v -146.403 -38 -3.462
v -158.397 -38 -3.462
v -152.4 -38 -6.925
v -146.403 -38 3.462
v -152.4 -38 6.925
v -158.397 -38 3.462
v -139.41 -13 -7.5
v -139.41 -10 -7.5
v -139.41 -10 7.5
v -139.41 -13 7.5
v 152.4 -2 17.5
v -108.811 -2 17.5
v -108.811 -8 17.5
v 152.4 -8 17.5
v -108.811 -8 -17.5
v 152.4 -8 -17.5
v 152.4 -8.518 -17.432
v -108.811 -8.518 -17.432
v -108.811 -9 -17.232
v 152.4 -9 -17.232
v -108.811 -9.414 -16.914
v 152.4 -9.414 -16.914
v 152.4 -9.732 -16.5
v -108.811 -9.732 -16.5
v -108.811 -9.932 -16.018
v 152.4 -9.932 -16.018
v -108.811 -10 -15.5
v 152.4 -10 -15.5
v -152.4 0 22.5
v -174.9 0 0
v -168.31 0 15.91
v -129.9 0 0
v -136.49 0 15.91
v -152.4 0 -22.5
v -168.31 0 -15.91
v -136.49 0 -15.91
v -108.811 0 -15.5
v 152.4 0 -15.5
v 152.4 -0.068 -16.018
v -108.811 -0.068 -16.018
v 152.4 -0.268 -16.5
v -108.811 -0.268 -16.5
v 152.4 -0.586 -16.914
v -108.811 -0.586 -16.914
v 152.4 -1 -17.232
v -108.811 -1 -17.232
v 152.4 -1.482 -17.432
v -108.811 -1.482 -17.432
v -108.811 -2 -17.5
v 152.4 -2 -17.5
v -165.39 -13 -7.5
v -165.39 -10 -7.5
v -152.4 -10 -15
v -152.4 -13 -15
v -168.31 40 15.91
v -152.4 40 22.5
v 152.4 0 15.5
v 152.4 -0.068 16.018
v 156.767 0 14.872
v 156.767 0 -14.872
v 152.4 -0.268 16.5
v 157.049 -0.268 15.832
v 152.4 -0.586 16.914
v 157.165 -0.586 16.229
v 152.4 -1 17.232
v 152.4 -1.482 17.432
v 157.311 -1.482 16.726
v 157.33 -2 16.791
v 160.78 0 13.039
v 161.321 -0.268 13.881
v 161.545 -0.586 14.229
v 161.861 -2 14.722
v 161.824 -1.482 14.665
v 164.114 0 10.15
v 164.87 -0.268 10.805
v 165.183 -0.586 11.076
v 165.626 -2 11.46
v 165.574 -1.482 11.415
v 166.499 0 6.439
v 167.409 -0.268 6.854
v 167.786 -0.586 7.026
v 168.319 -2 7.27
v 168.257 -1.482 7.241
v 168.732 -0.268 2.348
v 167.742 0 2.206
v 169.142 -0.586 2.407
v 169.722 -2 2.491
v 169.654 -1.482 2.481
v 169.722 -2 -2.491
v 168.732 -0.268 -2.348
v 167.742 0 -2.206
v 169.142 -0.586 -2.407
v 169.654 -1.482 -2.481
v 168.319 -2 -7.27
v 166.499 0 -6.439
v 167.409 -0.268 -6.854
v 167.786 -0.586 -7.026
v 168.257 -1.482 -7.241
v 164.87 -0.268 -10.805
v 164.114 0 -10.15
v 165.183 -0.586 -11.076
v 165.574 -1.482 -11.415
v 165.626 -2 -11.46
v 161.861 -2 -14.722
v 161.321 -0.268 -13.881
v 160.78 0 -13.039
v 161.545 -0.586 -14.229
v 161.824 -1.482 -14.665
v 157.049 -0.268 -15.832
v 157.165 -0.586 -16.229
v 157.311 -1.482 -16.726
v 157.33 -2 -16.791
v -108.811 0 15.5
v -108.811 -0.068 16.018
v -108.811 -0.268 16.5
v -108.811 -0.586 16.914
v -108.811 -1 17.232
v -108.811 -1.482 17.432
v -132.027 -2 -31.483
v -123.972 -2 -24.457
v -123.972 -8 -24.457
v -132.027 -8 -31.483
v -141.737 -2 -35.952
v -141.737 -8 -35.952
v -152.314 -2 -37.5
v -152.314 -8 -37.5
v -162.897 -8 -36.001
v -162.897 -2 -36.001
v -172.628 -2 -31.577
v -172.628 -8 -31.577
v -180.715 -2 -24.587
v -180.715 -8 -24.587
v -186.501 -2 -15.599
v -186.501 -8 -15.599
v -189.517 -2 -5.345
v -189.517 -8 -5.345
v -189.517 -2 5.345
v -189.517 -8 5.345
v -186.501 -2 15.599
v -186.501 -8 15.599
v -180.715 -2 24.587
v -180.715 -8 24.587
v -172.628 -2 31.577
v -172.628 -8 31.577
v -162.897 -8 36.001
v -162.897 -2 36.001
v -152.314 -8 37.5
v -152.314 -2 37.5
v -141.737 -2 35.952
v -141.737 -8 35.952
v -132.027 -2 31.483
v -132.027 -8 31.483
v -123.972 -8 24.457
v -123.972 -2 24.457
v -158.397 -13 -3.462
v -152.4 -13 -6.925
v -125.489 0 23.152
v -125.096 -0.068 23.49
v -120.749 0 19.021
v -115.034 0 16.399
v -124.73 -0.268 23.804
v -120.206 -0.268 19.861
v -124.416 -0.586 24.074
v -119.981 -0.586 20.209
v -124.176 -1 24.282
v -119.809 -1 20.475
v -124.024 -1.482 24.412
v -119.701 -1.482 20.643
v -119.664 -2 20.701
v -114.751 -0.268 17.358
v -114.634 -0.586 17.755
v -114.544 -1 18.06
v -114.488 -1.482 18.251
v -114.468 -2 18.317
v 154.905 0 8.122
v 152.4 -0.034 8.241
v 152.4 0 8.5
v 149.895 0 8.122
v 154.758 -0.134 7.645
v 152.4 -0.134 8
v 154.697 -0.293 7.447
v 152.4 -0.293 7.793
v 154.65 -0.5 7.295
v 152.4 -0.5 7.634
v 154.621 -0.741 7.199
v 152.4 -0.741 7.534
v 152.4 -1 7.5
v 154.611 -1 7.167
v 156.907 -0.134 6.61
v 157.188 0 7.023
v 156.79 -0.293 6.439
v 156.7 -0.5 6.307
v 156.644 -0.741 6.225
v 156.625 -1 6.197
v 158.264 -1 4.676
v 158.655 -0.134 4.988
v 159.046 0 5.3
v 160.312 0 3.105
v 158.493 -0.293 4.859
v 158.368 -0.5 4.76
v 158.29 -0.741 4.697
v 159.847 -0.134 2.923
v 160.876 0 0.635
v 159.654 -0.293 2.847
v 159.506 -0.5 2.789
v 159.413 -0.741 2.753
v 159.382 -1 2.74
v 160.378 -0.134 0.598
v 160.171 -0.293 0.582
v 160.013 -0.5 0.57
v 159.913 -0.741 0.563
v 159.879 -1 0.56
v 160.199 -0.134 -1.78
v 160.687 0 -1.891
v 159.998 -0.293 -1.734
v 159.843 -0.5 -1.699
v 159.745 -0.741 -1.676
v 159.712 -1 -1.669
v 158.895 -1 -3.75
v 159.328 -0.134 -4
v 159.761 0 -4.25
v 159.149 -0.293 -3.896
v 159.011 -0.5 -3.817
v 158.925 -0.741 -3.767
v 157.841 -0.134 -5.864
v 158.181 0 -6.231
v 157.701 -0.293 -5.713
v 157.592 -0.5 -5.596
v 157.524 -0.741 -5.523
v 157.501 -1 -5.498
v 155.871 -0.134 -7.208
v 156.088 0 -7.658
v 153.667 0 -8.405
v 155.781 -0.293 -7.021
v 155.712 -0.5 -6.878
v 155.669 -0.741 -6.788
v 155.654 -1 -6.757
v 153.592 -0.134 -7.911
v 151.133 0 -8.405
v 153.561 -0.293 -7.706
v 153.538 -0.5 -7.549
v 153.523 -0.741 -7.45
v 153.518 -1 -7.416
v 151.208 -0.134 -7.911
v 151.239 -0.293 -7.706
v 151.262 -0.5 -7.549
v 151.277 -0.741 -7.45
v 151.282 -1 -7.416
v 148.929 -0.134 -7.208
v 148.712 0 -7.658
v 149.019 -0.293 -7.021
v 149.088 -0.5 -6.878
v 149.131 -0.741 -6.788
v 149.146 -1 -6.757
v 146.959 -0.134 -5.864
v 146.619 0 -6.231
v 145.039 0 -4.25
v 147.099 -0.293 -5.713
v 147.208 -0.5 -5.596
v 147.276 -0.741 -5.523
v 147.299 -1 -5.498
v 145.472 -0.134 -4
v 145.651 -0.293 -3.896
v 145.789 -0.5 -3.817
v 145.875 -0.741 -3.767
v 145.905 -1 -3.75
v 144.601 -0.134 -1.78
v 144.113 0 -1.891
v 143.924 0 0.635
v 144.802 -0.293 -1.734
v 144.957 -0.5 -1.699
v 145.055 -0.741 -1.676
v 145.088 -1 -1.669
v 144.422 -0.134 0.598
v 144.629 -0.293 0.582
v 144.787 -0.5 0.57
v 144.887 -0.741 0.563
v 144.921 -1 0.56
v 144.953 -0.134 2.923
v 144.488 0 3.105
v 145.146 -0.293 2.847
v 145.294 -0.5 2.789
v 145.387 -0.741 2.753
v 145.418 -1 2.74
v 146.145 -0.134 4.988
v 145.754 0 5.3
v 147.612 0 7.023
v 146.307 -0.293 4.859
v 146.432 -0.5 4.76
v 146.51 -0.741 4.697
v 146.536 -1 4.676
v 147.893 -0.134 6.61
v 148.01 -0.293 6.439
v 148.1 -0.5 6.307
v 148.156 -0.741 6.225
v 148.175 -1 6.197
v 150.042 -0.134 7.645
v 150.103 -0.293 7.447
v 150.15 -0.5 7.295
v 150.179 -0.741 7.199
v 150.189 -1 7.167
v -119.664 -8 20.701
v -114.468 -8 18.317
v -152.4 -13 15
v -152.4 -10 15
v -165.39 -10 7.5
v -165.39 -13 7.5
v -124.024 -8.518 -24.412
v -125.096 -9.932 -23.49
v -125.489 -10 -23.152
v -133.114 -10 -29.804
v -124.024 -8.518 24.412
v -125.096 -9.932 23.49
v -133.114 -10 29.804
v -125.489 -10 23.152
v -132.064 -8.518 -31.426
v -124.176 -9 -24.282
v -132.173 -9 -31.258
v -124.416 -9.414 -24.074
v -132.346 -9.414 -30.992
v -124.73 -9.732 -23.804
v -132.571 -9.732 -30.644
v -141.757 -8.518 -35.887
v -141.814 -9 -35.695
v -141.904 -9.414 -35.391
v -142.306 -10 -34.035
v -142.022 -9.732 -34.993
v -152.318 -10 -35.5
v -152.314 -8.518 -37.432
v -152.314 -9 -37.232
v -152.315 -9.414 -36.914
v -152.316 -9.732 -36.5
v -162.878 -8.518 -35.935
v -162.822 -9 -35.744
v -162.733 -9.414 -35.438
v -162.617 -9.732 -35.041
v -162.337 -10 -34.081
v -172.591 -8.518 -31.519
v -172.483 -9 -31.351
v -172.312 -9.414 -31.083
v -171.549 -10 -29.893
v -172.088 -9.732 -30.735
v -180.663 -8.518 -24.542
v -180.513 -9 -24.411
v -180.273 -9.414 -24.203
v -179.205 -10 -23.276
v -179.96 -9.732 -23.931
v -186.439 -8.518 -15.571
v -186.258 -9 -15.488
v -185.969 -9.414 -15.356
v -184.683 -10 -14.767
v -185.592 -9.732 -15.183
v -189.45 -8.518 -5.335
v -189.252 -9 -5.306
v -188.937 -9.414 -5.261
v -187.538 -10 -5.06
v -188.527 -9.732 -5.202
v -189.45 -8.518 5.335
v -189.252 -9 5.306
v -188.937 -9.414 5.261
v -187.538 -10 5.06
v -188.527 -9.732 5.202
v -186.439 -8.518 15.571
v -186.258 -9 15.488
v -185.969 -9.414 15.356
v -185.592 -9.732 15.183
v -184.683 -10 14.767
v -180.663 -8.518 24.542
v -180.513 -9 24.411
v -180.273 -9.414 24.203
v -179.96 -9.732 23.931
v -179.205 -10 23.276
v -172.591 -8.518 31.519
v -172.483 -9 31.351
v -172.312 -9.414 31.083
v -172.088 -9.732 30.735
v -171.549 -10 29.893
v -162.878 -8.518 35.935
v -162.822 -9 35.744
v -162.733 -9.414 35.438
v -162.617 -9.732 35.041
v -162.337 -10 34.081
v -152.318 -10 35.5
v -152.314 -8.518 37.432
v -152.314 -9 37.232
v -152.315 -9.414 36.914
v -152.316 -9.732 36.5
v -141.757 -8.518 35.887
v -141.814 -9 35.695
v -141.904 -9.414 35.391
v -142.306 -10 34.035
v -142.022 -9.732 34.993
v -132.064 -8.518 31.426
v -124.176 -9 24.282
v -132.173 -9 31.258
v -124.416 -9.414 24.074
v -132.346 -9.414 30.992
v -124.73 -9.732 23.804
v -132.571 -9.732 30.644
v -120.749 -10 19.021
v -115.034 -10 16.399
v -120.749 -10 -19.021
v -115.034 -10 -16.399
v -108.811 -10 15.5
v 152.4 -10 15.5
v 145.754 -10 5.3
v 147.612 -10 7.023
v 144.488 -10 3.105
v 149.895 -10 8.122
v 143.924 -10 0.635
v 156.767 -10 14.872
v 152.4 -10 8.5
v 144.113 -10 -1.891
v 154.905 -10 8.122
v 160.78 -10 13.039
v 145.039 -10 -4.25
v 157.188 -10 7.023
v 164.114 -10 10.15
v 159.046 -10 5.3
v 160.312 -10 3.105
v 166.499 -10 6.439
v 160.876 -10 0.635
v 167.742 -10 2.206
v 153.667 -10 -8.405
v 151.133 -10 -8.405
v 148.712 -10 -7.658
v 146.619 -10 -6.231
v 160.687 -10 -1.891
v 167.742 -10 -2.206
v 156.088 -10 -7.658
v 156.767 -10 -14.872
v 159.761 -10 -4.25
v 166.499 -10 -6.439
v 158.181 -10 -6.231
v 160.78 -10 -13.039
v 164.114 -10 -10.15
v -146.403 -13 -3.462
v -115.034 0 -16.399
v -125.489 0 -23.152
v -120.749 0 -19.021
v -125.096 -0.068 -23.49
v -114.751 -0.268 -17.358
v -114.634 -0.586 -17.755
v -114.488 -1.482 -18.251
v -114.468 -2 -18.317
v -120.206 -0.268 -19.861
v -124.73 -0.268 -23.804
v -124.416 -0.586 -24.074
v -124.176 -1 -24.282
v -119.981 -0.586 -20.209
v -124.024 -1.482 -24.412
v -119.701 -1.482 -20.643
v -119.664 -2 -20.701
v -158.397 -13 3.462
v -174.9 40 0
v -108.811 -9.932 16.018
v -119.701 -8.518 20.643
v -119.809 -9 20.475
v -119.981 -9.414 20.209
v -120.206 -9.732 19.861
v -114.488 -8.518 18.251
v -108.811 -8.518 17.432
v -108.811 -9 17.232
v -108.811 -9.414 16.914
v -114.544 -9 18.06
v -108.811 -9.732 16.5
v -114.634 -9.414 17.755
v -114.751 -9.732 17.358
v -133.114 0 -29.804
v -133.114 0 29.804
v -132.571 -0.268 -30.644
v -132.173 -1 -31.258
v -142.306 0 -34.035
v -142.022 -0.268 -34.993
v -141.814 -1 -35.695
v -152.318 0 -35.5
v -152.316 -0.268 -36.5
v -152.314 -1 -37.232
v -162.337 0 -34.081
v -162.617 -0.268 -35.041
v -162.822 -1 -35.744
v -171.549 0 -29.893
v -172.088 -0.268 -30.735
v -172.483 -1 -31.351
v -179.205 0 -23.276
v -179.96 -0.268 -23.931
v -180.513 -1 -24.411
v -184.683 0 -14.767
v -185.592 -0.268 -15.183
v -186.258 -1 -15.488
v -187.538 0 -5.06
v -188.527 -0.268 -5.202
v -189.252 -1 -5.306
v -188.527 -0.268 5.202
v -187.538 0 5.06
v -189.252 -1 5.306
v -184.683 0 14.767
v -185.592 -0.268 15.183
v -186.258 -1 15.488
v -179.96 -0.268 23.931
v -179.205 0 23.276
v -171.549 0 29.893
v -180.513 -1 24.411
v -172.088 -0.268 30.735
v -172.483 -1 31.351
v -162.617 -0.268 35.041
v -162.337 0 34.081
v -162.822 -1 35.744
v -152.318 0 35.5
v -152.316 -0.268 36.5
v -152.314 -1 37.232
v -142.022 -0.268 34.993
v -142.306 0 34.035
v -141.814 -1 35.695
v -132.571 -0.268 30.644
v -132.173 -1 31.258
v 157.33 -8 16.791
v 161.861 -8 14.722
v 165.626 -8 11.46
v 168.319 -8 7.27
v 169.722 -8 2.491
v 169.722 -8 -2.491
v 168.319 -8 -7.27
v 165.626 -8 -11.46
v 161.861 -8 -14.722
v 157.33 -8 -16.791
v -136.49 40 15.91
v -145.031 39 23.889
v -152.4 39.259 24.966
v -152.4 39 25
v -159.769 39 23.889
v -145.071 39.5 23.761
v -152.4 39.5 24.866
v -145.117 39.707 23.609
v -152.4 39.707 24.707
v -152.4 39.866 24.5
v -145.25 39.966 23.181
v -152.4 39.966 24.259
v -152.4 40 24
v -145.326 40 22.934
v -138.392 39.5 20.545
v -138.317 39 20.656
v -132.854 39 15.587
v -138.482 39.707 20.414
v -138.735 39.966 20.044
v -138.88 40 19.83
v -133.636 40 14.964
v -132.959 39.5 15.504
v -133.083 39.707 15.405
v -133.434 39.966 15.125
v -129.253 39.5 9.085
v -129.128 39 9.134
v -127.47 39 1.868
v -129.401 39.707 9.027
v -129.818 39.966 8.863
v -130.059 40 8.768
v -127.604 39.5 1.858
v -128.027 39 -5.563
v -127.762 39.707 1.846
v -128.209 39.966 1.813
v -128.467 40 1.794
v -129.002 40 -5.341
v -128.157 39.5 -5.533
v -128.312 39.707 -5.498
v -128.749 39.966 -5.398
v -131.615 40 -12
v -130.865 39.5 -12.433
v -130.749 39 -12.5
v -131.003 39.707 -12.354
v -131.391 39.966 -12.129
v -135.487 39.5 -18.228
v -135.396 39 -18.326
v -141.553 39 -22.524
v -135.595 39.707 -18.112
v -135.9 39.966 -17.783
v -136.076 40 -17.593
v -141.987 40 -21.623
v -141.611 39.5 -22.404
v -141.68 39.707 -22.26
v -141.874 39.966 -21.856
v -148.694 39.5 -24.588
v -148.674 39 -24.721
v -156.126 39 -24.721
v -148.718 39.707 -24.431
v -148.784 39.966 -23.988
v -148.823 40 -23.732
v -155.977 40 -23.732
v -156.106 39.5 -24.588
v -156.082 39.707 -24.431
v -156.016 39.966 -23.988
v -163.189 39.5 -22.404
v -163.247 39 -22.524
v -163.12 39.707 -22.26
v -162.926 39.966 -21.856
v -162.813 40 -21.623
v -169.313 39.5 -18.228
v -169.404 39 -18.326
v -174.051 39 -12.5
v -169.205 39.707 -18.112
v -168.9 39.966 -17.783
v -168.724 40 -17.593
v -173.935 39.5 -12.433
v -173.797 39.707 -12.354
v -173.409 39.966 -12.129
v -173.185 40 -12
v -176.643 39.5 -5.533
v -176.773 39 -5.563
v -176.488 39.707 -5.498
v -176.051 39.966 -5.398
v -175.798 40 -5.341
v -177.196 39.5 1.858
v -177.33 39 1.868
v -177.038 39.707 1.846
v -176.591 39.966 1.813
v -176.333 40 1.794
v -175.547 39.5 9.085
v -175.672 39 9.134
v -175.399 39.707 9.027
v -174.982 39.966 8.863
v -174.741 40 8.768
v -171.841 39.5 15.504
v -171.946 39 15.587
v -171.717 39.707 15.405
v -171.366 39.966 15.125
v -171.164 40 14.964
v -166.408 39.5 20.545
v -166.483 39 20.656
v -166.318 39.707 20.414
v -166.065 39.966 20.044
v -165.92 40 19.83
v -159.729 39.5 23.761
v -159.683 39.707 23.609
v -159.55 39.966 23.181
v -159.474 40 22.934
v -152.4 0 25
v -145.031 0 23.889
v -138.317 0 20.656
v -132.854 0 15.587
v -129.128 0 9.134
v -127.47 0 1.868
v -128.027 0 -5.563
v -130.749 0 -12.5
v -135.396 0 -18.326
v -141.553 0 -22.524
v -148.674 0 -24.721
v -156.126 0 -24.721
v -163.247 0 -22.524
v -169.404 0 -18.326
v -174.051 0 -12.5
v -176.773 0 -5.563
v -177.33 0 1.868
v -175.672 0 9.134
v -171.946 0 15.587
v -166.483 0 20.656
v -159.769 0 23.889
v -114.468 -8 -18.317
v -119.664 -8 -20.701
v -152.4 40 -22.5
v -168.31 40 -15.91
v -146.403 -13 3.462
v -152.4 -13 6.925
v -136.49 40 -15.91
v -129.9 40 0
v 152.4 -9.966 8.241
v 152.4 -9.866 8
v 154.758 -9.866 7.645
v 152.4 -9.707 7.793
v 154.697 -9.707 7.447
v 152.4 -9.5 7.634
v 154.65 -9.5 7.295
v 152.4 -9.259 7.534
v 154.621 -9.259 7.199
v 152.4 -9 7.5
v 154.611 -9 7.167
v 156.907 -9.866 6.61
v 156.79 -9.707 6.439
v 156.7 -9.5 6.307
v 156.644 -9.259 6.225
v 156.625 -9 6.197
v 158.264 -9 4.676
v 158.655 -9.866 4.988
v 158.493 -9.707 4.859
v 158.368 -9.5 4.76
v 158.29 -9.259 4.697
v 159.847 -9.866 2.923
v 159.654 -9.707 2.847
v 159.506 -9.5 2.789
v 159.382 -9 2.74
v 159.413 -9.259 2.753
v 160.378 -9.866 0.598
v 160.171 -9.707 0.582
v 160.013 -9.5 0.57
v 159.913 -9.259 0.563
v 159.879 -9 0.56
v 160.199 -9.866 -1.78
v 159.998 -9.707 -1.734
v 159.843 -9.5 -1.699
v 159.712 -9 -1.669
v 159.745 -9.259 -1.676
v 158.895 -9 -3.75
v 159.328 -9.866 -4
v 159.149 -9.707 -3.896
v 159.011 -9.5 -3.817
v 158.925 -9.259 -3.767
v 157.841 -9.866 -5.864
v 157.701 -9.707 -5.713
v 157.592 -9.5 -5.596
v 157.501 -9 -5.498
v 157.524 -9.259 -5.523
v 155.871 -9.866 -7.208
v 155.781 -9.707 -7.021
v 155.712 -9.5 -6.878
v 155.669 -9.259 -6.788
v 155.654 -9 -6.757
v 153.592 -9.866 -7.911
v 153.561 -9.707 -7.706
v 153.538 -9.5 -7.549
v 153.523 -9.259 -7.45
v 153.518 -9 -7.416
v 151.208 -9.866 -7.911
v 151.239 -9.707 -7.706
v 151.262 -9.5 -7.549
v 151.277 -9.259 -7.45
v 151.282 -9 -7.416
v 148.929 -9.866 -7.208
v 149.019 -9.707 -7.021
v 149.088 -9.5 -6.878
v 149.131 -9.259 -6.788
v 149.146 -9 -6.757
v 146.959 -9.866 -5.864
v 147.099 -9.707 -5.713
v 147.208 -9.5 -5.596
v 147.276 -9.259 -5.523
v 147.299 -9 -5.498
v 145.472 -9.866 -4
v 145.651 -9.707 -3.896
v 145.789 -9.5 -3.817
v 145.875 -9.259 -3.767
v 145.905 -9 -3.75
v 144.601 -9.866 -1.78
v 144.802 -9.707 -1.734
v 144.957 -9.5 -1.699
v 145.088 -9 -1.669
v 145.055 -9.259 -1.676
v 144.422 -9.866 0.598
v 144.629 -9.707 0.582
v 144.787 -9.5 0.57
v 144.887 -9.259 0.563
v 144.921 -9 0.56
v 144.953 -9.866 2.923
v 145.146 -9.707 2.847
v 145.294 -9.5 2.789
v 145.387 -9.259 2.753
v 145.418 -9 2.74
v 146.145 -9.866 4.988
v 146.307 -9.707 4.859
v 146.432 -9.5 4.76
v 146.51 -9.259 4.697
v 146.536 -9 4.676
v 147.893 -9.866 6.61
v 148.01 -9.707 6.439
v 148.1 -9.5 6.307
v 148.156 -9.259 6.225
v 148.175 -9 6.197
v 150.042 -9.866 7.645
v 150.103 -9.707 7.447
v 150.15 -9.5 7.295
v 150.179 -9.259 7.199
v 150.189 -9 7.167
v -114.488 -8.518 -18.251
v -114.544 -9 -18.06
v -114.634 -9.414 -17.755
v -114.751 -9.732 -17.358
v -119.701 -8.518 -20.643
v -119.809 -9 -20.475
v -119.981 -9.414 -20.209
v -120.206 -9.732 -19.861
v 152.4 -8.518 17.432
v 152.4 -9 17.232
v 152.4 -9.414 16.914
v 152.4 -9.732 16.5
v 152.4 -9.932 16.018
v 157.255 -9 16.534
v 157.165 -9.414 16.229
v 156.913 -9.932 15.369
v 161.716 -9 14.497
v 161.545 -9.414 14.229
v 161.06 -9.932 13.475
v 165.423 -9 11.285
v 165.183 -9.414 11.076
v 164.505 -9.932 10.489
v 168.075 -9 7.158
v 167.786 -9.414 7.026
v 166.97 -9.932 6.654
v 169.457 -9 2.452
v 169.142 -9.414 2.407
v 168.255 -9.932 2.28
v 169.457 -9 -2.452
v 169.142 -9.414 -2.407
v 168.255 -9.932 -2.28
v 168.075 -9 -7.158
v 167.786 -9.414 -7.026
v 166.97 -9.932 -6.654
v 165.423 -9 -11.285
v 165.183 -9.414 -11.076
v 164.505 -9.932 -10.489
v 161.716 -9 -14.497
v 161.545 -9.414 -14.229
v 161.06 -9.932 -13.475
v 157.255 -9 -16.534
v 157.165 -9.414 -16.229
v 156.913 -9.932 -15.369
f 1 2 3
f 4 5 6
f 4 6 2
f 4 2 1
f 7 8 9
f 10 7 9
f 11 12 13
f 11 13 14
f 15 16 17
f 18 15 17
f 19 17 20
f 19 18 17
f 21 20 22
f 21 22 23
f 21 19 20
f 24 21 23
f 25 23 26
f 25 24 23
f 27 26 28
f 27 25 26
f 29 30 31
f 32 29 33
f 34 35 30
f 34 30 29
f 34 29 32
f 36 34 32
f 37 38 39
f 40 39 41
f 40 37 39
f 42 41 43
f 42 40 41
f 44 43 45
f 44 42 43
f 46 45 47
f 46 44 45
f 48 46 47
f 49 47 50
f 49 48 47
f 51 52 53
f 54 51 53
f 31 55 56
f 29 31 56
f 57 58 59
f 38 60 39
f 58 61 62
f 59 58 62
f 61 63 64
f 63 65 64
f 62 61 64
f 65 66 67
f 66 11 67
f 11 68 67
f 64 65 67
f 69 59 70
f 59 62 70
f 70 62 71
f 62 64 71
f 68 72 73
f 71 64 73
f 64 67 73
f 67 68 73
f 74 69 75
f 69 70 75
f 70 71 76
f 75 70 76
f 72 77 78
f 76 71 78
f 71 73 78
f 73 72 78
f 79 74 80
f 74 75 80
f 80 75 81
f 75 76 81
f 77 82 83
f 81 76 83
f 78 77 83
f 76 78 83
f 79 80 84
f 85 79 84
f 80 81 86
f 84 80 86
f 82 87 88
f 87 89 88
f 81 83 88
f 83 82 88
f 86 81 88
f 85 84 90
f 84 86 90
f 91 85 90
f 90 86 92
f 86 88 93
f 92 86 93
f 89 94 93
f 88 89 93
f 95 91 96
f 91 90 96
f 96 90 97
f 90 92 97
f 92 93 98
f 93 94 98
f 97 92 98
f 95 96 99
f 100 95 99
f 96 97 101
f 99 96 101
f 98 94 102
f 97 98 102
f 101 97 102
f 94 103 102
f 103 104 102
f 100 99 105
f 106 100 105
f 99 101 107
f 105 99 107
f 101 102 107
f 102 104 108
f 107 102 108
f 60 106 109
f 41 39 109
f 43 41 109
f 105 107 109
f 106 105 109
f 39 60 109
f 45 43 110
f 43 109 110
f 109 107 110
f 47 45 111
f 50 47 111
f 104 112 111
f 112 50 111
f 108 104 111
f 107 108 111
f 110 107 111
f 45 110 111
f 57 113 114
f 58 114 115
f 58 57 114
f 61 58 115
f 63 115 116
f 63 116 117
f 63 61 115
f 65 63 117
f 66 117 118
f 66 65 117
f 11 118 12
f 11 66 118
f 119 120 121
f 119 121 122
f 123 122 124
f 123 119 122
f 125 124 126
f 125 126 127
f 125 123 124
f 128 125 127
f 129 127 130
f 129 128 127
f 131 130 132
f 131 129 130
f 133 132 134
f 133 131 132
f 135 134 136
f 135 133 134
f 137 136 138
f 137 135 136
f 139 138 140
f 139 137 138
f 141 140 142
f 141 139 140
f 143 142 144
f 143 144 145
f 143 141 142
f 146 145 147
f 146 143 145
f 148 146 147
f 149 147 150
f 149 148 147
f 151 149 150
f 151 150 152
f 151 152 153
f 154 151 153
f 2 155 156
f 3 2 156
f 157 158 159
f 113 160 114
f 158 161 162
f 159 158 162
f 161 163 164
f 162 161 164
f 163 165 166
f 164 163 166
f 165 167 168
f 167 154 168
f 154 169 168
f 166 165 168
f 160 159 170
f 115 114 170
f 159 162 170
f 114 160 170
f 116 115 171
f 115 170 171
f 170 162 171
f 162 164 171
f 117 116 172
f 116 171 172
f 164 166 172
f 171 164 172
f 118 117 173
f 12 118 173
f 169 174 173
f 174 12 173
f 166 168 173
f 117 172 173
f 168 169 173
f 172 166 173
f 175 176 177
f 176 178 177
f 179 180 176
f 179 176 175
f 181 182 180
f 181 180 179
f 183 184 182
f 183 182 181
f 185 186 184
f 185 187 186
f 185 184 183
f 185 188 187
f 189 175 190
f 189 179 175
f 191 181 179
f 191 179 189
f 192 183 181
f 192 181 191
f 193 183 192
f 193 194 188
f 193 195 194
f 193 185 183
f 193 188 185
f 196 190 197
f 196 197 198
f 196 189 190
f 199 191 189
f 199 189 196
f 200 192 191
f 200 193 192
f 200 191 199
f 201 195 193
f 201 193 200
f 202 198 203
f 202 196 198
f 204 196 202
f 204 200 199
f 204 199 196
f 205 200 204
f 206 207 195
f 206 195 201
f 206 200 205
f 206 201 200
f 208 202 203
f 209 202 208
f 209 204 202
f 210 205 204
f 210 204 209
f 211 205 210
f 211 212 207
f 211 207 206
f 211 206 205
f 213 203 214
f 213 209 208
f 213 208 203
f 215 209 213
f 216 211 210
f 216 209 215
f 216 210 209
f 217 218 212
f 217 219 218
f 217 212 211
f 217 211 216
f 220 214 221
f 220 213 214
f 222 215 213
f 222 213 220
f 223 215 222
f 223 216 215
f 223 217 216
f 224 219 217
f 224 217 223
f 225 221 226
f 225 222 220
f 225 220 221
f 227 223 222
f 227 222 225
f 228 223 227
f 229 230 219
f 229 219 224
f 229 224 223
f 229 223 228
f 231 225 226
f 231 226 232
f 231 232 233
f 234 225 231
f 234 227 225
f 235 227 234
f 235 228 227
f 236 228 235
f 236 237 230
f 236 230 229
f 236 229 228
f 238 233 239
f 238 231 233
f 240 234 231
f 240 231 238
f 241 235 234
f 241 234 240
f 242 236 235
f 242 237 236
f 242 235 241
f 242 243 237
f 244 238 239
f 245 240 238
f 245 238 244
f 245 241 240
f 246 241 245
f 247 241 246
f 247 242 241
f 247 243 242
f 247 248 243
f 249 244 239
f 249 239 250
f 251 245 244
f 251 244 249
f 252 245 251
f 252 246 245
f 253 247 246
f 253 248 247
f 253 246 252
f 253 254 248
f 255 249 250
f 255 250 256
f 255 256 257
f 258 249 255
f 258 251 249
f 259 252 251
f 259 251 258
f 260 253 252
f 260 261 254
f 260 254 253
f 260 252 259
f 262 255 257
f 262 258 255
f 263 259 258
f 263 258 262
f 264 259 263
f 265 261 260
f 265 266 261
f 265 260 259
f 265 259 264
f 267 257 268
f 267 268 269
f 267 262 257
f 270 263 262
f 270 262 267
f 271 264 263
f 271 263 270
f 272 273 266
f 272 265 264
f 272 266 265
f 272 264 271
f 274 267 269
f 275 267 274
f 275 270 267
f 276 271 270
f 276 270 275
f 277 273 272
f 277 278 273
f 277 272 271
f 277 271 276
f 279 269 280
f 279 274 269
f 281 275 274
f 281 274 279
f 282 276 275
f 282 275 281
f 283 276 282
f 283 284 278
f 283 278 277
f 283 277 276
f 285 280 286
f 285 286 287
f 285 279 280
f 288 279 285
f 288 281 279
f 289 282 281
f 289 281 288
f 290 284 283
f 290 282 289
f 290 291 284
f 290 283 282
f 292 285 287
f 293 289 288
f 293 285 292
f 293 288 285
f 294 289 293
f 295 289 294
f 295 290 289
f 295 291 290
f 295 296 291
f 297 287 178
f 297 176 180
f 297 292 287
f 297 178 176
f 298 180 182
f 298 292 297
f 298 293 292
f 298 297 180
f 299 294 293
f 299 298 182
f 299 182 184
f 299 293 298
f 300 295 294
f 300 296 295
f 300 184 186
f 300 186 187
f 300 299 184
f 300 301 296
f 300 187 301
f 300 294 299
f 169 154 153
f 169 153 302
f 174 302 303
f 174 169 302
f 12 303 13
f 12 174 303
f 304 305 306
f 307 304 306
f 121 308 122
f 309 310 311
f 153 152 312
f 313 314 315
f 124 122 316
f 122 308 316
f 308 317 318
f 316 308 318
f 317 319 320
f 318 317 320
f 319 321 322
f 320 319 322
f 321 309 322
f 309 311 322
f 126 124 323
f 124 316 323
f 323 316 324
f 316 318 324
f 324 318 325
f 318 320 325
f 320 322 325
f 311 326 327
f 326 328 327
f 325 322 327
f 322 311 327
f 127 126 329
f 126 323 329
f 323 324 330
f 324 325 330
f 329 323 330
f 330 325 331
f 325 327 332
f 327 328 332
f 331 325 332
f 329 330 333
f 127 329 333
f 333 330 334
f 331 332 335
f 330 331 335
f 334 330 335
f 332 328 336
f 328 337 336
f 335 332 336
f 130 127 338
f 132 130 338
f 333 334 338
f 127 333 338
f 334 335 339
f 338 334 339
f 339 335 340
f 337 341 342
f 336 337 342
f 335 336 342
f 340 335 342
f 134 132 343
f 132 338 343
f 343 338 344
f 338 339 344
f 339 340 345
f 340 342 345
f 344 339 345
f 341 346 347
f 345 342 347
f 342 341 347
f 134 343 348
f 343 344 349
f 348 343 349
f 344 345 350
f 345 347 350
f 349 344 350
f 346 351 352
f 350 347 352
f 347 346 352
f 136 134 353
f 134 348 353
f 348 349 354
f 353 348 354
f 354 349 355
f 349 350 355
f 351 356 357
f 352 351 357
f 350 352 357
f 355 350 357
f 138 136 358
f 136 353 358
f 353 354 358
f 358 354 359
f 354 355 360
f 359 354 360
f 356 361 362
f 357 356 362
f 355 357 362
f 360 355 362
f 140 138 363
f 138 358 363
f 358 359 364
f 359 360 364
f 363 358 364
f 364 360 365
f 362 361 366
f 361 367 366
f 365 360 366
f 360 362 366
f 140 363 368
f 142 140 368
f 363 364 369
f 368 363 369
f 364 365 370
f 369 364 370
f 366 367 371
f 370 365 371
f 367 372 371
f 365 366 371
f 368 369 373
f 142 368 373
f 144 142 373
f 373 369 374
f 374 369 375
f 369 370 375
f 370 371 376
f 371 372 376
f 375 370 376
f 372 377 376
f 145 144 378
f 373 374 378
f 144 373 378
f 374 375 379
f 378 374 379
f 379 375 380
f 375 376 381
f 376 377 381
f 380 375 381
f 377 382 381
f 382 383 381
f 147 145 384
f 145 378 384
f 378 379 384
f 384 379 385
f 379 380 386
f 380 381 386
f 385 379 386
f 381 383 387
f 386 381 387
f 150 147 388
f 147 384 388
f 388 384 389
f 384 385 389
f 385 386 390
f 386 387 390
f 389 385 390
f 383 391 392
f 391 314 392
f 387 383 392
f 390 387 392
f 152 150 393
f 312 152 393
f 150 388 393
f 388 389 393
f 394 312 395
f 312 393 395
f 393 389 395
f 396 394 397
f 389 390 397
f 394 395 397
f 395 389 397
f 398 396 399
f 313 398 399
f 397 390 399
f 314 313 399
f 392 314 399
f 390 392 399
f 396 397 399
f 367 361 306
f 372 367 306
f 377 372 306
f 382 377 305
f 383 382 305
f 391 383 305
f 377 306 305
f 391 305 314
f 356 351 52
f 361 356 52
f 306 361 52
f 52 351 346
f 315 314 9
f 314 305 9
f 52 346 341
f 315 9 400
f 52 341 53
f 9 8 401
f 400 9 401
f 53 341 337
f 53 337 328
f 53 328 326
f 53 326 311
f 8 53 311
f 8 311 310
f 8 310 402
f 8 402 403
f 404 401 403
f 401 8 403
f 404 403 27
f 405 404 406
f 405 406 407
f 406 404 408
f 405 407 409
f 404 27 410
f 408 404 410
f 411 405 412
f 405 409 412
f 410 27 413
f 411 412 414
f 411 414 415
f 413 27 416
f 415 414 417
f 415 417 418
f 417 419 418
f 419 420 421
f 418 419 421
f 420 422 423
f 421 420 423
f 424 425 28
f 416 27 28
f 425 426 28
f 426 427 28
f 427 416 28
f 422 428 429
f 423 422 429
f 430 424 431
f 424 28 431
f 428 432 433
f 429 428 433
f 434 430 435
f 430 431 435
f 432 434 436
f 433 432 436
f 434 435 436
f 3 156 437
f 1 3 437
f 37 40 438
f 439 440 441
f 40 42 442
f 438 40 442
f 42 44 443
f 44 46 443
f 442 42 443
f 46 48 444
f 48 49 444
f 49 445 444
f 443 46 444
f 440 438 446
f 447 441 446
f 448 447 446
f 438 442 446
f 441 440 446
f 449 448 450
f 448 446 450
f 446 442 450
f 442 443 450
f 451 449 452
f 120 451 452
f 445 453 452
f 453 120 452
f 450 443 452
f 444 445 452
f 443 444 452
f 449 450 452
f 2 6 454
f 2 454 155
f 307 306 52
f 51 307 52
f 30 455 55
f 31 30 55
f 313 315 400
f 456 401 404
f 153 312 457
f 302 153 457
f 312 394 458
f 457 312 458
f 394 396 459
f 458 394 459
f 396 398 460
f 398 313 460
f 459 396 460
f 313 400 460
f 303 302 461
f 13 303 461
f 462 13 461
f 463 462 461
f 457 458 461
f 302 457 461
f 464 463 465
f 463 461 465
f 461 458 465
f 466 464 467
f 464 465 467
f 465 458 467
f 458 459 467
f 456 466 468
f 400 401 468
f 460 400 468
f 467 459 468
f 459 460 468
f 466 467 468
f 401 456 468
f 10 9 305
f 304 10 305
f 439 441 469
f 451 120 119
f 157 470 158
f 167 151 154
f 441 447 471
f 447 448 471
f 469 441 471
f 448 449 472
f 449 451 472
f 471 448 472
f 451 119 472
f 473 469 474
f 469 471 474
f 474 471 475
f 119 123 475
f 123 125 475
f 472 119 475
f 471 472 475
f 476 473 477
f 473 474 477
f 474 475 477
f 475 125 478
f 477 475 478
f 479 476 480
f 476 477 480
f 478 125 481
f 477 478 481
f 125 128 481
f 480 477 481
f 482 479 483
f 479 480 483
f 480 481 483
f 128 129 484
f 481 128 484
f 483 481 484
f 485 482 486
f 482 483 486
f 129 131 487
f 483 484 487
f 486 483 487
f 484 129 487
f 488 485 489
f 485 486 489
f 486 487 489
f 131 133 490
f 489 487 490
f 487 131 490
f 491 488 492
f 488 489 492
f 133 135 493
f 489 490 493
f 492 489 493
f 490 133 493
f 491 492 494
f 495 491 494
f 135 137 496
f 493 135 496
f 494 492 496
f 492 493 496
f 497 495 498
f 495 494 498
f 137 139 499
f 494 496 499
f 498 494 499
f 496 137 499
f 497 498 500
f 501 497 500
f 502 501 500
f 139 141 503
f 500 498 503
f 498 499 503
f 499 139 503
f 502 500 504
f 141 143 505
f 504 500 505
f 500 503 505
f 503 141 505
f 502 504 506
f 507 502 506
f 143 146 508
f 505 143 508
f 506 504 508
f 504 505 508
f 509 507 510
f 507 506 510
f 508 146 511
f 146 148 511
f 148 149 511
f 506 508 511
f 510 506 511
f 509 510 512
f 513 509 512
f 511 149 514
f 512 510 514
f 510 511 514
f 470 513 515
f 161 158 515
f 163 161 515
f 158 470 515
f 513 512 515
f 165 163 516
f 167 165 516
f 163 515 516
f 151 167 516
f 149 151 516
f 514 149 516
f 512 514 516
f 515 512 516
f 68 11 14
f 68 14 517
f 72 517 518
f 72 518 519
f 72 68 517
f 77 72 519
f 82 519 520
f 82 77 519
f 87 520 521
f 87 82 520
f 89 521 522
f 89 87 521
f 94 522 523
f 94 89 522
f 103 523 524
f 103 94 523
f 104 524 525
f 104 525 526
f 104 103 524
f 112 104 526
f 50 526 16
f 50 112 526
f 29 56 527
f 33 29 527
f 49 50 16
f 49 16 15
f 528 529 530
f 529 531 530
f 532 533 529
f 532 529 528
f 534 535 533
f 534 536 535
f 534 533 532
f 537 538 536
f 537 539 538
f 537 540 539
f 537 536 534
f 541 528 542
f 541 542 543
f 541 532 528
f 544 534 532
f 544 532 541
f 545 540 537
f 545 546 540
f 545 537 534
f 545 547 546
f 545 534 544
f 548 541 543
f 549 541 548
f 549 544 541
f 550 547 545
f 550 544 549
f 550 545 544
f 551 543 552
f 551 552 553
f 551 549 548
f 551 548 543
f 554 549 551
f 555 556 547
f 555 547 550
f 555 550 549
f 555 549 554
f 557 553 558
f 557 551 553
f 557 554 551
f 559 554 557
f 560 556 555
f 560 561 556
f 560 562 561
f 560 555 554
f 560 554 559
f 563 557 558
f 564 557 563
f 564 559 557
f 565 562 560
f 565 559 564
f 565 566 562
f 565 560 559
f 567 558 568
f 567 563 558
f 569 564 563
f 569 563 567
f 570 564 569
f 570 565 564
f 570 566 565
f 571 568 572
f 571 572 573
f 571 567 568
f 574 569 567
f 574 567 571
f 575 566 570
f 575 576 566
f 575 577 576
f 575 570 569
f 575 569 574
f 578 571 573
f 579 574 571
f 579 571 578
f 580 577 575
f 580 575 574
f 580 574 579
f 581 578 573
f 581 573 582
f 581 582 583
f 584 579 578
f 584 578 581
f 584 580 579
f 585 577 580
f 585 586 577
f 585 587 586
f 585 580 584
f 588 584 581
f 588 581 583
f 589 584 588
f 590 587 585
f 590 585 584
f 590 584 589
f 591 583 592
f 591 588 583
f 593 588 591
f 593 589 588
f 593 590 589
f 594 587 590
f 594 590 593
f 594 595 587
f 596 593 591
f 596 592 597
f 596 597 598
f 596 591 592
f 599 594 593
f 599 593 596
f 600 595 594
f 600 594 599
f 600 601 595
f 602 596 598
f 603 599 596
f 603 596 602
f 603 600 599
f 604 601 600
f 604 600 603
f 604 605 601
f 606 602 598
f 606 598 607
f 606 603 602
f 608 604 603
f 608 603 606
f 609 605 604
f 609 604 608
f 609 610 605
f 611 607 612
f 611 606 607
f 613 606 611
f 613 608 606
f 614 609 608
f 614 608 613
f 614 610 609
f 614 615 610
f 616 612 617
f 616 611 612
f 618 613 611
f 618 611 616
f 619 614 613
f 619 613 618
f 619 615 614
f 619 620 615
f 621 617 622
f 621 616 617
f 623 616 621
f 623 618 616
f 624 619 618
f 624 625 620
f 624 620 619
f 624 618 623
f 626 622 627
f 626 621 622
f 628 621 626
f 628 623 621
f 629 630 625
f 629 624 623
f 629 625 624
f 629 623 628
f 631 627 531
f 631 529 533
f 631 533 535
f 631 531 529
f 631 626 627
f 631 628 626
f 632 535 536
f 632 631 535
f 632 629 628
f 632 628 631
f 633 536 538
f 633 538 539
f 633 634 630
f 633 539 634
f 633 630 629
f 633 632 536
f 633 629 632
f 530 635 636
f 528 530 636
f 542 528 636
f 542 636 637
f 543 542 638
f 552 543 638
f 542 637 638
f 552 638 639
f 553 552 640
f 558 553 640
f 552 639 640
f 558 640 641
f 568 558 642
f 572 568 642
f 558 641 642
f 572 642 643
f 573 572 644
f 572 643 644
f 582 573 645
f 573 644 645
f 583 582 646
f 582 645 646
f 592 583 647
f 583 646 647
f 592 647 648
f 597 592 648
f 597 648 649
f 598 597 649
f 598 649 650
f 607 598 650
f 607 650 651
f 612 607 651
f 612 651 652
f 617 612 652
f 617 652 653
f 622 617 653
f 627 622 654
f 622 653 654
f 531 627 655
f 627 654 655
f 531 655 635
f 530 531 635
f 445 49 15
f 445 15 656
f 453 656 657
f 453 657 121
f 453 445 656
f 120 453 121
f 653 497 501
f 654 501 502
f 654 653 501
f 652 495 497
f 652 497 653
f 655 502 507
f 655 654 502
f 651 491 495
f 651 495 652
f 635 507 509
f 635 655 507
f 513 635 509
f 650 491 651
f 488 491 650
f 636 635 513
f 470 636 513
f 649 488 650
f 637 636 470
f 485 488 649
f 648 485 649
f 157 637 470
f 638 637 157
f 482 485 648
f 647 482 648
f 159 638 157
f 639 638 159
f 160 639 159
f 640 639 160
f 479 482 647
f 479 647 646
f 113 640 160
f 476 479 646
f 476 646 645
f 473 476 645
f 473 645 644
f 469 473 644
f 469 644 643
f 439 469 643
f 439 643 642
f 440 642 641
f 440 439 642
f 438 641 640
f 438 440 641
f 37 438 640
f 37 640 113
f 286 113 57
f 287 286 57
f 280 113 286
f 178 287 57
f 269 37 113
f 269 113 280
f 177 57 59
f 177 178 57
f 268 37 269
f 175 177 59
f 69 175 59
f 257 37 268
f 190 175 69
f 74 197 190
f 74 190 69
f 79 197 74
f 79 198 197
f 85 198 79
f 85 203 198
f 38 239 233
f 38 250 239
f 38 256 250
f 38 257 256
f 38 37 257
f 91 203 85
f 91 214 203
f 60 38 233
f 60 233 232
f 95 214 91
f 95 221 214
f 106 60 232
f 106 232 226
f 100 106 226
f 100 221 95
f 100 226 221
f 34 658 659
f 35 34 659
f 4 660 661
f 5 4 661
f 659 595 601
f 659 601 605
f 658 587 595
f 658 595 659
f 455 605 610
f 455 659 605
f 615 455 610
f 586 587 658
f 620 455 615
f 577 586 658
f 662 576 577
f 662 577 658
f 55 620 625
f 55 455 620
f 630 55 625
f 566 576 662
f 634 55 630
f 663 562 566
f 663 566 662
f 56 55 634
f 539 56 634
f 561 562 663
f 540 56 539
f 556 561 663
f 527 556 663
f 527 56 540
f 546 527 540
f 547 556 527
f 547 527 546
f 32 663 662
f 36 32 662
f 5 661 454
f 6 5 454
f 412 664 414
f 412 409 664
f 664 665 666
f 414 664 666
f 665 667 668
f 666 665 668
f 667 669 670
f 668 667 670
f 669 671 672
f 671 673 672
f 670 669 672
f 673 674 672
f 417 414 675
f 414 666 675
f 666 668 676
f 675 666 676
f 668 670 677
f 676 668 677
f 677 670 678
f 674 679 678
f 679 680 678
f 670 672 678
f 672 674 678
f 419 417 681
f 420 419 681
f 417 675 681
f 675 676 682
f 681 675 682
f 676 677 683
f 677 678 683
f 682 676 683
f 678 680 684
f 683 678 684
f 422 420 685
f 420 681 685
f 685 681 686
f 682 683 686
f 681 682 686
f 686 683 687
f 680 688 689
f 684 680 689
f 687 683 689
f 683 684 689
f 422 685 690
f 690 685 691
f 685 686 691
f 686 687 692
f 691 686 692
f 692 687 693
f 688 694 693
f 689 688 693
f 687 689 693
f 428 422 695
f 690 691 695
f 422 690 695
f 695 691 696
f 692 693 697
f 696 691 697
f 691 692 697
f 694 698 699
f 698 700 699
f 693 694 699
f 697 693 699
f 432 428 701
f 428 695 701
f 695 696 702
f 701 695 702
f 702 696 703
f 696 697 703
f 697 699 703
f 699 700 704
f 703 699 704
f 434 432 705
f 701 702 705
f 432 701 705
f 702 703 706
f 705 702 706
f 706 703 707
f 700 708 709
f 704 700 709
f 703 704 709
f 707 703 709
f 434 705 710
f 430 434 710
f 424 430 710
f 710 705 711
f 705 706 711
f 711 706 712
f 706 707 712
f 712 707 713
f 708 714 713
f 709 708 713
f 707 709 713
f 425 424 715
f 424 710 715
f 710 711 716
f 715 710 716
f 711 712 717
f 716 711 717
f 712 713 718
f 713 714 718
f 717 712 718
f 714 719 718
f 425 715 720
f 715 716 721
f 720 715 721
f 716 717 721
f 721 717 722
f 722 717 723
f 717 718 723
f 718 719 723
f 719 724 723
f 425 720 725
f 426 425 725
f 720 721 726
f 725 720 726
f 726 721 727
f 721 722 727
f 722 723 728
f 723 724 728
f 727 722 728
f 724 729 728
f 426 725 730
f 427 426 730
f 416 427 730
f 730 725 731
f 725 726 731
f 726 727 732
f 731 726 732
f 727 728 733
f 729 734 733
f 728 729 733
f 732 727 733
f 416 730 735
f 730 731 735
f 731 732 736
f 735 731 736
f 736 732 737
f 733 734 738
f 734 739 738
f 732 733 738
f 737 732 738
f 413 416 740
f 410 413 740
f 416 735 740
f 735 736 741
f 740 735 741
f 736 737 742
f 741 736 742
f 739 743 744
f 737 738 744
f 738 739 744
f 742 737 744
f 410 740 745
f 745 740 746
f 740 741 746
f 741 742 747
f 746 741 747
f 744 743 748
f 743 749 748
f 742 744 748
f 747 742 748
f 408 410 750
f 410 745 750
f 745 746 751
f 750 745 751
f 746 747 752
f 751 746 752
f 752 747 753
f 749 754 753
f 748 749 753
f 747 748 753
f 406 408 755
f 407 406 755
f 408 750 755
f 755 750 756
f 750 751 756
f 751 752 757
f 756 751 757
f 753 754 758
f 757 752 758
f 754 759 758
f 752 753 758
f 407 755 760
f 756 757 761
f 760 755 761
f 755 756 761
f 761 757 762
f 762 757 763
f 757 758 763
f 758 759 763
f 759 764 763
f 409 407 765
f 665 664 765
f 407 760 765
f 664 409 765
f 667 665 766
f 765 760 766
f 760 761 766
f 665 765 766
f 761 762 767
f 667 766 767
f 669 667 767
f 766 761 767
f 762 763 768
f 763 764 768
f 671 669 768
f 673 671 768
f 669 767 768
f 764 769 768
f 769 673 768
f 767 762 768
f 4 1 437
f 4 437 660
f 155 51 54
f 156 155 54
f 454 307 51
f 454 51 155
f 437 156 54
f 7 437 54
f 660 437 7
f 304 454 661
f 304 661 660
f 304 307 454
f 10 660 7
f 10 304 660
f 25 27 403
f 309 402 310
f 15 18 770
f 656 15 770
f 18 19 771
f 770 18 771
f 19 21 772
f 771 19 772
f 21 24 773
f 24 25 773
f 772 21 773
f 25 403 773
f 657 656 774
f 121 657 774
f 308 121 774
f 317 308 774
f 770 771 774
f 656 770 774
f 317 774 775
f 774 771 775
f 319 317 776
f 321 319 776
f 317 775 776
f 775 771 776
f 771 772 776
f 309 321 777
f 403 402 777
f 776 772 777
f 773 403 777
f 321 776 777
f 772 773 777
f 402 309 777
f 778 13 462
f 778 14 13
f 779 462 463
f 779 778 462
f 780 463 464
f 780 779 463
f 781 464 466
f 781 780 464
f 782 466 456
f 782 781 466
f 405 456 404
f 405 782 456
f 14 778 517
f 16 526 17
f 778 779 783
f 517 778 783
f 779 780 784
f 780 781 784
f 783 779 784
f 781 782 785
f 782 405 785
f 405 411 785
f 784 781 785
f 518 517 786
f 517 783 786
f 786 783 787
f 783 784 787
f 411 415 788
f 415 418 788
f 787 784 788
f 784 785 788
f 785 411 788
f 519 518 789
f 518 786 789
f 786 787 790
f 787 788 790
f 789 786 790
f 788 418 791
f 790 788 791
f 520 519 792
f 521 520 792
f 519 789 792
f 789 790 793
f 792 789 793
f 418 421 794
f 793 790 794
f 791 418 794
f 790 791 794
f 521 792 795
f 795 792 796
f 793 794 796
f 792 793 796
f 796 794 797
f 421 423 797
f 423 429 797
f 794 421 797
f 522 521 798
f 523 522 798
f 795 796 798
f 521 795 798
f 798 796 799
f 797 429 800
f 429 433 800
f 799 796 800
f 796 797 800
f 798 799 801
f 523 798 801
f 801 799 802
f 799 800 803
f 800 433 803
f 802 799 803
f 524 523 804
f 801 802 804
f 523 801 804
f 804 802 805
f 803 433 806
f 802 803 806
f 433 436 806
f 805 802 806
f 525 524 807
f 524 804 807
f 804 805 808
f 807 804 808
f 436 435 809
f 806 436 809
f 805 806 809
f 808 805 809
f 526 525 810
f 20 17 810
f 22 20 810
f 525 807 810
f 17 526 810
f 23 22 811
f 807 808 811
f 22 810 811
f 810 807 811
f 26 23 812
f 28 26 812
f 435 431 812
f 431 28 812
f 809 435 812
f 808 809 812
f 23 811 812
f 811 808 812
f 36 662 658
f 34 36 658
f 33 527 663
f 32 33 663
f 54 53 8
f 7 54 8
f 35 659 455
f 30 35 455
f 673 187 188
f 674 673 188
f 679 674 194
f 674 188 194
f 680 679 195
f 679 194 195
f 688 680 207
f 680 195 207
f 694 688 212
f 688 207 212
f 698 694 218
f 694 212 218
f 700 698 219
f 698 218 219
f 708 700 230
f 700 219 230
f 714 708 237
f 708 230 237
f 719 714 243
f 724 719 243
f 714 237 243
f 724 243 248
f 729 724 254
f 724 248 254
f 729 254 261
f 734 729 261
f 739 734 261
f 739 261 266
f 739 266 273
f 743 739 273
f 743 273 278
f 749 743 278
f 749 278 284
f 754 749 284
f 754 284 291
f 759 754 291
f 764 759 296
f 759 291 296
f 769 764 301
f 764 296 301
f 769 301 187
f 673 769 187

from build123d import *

# Parameters (mm, degrees)
SKETCH1_R           = 7.5
BOSS_EXTRUDE1_DEPTH = 10
SKETCH1_3_R         = 25
BOSS_EXTRUDE2_DEPTH = 40
CUT_EXTRUDE1_DEPTH  = 40
BOSS_EXTRUDE3_DEPTH = 3
BOSS_EXTRUDE4_DEPTH = 25
FILLET1_R           = 2
FILLET2_R           = 1


with BuildPart() as part:
    # Sketch1 → Boss-Extrude1 (new body)
    with BuildSketch(Plane(origin=(0, 0, 0), x_dir=(1, 0, 0), z_dir=(0, 1, 0))):
        with BuildLine():
            ThreePointArc((152.4, -17.5), (169.9, 0), (152.4, 17.5))
            Line((152.4, 17.5), (-108.811010565, 17.5))
            ThreePointArc((-108.811010565, 17.5), (-117.151587127, 19.322134817), (-123.972398194, 24.456521739))
            ThreePointArc((-123.972398194, 24.456521739), (-189.9, 0), (-123.972398194, -24.456521739))
            ThreePointArc((-123.972398194, -24.456521739), (-117.151587127, -19.322134817), (-108.811010565, -17.5))
            Line((-108.811010565, -17.5), (152.4, -17.5))
        make_face()
        with Locations((152.4, 0)):
            Circle(SKETCH1_R, mode=Mode.SUBTRACT)
    extrude(amount=-BOSS_EXTRUDE1_DEPTH)

    # Sketch1<3> → Boss-Extrude2 (add)
    with BuildSketch(Plane(origin=(0, 0, 0), x_dir=(1, 0, 0), z_dir=(0, 1, 0))):
        with Locations((-152.4, 0)):
            Circle(SKETCH1_3_R)
    extrude(amount=BOSS_EXTRUDE2_DEPTH)

    # Sketch2 → Cut-Extrude1 (cut)
    with BuildSketch(Plane(origin=(0, 40, 0), x_dir=(1, 0, 0), z_dir=(0, 1, 0))):
        Polygon((-129.9, 0), (-136.490097423, 15.909902577), (-152.4, 22.5), (-168.309902577, 15.909902577), (-174.9, 0), (-168.309902577, -15.909902577), (-152.4, -22.5), (-136.490097423, -15.909902577), align=None)
    extrude(amount=-CUT_EXTRUDE1_DEPTH, mode=Mode.SUBTRACT)

    # Sketch3 → Boss-Extrude3 (add)
    with BuildSketch(Plane.XZ.offset(10)):
        Polygon((-139.409618943, 7.5), (-152.4, 15), (-165.390381057, 7.5), (-165.390381057, -7.5), (-152.4, -15), (-139.409618943, -7.5), align=None)
    extrude(amount=BOSS_EXTRUDE3_DEPTH)

    # Sketch4 → Boss-Extrude4 (add)
    with BuildSketch(Plane.XZ.offset(13)):
        Polygon((-146.402774079, 3.4625), (-152.4, 6.925), (-158.397225921, 3.4625), (-158.397225921, -3.4625), (-152.4, -6.925), (-146.402774079, -3.4625), (-146.402774079, 0), align=None)
    extrude(amount=BOSS_EXTRUDE4_DEPTH)

    # Fillet1
    fillet1_edges = [part.edges().sort_by_distance(p)[0] for p in [
        (169.9, -10, 0),
        (-117.151587127, -10, -19.322134817),
        (-117.151587127, -10, 19.322134817),
        (21.794494718, -10, 17.5),
        (21.794494718, -10, -17.5),
        (-189.9, -10, 0),
        (-117.151587127, 0, -19.322134817),
        (-117.151587127, 0, 19.322134817),
        (-189.9, 0, 0),
        (21.794494718, 0, -17.5),
        (21.794494718, 0, 17.5),
        (169.9, 0, 0),
    ]]
    fillet(fillet1_edges, radius=FILLET1_R)

    # Fillet2
    fillet2_edges = [part.edges().sort_by_distance(p)[0] for p in [
        (144.9, -10, 0),
        (144.9, 0, 0),
        (-177.4, 40, 0),
    ]]
    fillet(fillet2_edges, radius=FILLET2_R)


solid = part.part
